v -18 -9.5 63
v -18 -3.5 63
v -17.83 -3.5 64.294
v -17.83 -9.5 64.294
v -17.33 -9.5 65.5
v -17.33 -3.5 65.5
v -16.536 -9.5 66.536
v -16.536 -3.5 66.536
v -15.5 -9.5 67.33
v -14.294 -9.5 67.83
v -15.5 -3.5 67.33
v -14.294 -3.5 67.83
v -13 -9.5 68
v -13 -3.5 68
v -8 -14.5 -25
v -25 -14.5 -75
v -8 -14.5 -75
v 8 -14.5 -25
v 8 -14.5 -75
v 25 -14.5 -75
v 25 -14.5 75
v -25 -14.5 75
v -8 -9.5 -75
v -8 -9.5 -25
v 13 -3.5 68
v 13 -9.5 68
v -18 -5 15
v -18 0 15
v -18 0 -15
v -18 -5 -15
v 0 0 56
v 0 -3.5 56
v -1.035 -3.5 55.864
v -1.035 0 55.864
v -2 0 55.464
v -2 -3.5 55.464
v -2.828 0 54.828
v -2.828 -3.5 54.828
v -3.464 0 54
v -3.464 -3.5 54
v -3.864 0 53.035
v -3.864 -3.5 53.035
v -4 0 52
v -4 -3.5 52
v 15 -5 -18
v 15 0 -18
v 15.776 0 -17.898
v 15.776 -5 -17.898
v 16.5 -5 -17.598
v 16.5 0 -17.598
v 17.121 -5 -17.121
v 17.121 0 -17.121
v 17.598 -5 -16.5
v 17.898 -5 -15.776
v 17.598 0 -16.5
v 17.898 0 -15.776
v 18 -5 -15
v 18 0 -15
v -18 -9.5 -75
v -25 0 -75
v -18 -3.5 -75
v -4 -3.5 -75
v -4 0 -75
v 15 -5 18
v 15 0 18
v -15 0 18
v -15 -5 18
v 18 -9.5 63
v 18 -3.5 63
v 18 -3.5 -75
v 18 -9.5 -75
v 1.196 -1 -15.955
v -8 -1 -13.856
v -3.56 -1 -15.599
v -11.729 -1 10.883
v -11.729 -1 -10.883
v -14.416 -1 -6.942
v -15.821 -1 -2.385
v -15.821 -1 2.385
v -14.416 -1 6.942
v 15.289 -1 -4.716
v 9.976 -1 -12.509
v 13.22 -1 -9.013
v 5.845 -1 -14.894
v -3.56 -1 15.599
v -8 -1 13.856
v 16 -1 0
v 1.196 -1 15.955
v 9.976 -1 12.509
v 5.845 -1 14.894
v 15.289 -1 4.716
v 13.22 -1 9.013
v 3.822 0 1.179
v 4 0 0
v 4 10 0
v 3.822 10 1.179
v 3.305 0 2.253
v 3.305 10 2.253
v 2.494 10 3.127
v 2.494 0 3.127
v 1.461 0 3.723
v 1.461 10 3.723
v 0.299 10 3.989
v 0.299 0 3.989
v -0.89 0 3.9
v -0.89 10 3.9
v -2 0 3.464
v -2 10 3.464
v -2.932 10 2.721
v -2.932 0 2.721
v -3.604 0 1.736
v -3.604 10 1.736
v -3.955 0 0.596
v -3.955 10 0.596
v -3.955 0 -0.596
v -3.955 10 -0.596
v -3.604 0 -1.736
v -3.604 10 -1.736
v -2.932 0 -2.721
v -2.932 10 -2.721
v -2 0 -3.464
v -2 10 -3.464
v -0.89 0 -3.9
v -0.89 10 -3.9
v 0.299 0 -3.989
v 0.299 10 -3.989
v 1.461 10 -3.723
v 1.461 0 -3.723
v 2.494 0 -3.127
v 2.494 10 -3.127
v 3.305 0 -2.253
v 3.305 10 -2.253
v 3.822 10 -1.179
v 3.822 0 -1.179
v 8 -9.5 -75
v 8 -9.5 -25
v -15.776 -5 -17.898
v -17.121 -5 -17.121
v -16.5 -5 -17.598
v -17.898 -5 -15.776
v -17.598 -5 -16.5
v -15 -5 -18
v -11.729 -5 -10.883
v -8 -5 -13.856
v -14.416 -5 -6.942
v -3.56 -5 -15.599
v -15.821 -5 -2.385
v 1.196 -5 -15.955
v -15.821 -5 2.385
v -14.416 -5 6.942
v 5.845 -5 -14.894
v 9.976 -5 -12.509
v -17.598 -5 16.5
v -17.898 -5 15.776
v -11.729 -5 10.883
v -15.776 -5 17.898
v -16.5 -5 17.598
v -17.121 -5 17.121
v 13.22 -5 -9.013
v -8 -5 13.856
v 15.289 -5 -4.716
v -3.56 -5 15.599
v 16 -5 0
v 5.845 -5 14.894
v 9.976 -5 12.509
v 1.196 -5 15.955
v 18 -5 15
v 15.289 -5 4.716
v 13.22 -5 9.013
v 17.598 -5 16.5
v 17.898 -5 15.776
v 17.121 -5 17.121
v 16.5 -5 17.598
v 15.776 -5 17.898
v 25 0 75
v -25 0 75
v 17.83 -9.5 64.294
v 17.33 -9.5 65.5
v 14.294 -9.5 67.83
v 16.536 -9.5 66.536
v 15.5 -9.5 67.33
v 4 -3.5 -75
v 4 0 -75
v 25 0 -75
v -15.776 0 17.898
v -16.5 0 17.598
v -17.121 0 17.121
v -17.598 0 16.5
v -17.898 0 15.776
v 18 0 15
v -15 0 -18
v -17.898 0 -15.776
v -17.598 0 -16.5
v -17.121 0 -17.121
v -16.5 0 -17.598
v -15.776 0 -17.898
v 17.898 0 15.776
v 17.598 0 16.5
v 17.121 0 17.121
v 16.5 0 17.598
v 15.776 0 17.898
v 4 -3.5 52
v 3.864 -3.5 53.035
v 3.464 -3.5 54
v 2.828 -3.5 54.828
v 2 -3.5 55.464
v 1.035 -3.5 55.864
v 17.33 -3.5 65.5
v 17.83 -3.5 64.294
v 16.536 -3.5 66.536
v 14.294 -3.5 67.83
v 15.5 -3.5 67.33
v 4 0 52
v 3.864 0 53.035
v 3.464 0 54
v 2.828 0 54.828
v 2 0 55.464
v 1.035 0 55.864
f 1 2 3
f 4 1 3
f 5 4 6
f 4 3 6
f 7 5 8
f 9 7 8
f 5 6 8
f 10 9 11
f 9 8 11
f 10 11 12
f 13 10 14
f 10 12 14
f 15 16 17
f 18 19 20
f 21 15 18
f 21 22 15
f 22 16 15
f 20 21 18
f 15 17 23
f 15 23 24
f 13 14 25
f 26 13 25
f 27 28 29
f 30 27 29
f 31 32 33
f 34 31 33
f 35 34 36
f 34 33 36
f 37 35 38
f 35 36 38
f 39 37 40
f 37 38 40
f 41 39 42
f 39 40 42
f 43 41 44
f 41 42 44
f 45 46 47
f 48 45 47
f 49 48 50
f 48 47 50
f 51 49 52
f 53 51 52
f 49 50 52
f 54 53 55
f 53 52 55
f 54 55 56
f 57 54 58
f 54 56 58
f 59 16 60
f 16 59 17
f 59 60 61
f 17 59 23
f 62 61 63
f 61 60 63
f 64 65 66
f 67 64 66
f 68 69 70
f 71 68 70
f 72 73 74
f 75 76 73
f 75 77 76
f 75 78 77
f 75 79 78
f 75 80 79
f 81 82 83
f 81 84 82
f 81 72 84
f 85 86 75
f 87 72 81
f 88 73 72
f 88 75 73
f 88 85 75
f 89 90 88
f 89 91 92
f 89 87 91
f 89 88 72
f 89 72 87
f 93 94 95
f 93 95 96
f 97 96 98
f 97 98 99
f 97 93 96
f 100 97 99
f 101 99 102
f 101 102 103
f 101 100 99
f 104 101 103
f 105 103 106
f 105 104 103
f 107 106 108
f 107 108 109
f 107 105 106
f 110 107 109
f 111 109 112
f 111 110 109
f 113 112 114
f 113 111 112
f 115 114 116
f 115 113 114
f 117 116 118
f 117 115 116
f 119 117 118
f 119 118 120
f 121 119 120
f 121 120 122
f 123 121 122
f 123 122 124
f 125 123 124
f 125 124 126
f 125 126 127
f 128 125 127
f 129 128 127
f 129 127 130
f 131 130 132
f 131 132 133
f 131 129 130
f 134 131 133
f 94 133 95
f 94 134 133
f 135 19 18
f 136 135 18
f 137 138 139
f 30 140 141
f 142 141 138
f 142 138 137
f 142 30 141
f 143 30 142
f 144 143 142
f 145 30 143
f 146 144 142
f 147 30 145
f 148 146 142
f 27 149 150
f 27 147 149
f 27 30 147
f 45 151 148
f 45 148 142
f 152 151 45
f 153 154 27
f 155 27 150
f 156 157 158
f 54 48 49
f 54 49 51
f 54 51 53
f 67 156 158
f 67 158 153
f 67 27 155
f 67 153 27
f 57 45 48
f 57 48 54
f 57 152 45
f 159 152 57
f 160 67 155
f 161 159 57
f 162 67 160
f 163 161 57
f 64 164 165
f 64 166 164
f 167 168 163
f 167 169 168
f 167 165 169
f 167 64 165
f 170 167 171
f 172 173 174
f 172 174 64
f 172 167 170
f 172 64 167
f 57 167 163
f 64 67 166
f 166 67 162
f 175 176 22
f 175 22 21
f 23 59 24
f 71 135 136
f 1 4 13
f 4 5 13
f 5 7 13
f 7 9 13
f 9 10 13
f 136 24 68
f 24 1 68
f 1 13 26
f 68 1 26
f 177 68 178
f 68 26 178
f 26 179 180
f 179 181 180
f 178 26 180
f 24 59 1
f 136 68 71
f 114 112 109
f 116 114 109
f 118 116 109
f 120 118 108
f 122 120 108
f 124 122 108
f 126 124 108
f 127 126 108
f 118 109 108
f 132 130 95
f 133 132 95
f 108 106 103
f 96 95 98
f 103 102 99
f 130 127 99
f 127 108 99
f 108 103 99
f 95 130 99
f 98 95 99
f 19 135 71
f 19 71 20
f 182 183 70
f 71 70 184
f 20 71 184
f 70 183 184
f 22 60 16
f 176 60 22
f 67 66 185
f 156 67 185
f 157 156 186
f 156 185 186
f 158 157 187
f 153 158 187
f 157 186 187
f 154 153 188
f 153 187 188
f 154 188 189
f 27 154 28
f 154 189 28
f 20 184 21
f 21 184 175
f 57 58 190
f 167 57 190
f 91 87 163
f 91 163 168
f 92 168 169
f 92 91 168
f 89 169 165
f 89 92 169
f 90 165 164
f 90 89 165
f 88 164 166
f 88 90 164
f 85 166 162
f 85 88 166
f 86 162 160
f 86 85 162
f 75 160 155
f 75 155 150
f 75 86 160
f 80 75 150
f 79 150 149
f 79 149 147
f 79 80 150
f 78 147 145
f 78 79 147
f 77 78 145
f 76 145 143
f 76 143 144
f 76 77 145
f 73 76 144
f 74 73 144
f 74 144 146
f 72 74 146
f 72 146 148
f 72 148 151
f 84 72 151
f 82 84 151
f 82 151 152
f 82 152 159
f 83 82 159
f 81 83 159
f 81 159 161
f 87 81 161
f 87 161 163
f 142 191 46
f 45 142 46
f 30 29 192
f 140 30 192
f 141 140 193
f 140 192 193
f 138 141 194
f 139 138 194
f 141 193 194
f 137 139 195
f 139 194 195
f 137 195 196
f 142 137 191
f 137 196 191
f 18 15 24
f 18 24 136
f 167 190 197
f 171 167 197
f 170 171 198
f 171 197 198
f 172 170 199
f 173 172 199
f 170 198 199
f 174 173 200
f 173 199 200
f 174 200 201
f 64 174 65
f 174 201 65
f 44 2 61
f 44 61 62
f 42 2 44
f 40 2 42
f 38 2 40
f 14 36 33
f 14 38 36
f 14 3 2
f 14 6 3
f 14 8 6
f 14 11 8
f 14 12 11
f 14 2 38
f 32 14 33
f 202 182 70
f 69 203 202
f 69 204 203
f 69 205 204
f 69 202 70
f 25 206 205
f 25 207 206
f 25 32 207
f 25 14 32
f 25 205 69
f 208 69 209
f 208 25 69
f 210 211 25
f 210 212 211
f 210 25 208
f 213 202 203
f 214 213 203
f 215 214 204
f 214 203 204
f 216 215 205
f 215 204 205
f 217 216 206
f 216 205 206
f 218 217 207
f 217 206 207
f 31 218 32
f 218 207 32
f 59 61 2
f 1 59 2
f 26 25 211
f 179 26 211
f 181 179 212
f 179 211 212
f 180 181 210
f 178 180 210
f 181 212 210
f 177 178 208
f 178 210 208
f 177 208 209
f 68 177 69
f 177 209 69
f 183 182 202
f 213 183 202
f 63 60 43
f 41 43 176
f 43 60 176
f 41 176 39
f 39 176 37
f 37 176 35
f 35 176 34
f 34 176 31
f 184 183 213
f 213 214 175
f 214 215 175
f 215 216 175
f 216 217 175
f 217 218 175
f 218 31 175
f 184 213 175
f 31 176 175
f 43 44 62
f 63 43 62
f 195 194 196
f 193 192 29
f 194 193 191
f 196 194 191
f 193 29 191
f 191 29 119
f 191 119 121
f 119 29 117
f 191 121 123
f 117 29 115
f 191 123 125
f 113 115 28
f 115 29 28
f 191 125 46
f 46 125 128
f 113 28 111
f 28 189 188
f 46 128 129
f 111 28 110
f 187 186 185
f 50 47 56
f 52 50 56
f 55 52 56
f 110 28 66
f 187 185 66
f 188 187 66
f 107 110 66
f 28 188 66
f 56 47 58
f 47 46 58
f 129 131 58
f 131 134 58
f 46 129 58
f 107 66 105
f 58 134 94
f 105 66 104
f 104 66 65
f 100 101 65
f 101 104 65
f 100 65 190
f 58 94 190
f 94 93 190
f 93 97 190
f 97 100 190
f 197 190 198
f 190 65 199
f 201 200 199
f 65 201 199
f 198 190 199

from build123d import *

# Parameters (mm, degrees)
F0_W      = 50
F0_H      = 150
F1_DEPTH  = 3.5
F3_DEPTH  = 6
F4_DEPTH  = 25
F5_W      = 50
F5_H      = 150
F6_DEPTH  = 5
F7_R      = 16
F7_R_2    = 4
F8_DEPTH  = 1
F9_DEPTH  = 5
F10_DEPTH = 10
F11_W     = 16
F11_H     = 50
F12_DEPTH = 6.1


with BuildPart() as f1:
    # F0 (on Front) → F1 (new body)
    with BuildSketch(Plane.XZ):
        Rectangle(F0_W, F0_H)
    extrude(amount=F1_DEPTH)

    # F2 (on face) → F3 (join)
    with BuildSketch(Plane.XZ.offset(3.5)):
        with BuildLine():
            Line((-13, 68), (13, 68))
            ThreePointArc((13, 68), (16.5355339059, 66.5355339059), (18, 63))
            Line((18, 63), (18, -68))
            Line((18, -68), (18, -75))
            Line((18, -75), (25, -75))
            Line((25, -75), (25, 75))
            Line((25, 75), (-25, 75))
            Line((-25, 75), (-25, -75))
            Line((-25, -75), (-18, -75))
            Line((-18, -75), (-18, -68))
            Line((-18, -68), (-18, 63))
            ThreePointArc((-18, 63), (-16.5355339059, 66.5355339059), (-13, 68))
        make_face()
    extrude(amount=F3_DEPTH)

    # F2 (on face) → F4 (cut)
    with BuildSketch(Plane.XZ.offset(3.5)):
        with BuildLine():
            Line((-4, -75), (4, -75))
            Line((4, -75), (4, 52))
            ThreePointArc((4, 52), (2.8284271247, 54.8284271247), (0, 56))
            ThreePointArc((0, 56), (-2.8284271247, 54.8284271247), (-4, 52))
            Line((-4, 52), (-4, -75))
        make_face()
    extrude(amount=-F4_DEPTH, mode=Mode.SUBTRACT)

    # F5 (on face) → F6 (join)
    with BuildSketch(Plane.XZ.offset(9.5)):
        Rectangle(F5_W, F5_H)
    extrude(amount=F6_DEPTH)

    # F11 (on face) → F12 (cut)
    with BuildSketch(Plane.XZ.offset(14.5)):
        with Locations((0, -50)):
            Rectangle(F11_W, F11_H)
    extrude(amount=-F12_DEPTH, mode=Mode.SUBTRACT)


with BuildPart() as f8:
    # F7 (on Front) → F8 (new body)
    with BuildSketch(Plane.XZ):
        with BuildLine():
            ThreePointArc((-18, -15), (-17.1213203436, -17.1213203436), (-15, -18))
            Line((-15, -18), (15, -18))
            ThreePointArc((15, -18), (17.1213203436, -17.1213203436), (18, -15))
            Line((18, -15), (18, 15))
            ThreePointArc((18, 15), (17.1213203436, 17.1213203436), (15, 18))
            Line((15, 18), (-15, 18))
            ThreePointArc((-15, 18), (-17.1213203436, 17.1213203436), (-18, 15))
            Line((-18, 15), (-18, -15))
        make_face()
        Circle(F7_R, mode=Mode.SUBTRACT)
        Circle(F7_R)
        Circle(F7_R_2, mode=Mode.SUBTRACT)
        Circle(F7_R_2)
    extrude(amount=F8_DEPTH)

    # F7 (on Front) → F9 (join)
    with BuildSketch(Plane.XZ):
        with BuildLine():
            ThreePointArc((-18, -15), (-17.1213203436, -17.1213203436), (-15, -18))
            Line((-15, -18), (15, -18))
            ThreePointArc((15, -18), (17.1213203436, -17.1213203436), (18, -15))
            Line((18, -15), (18, 15))
            ThreePointArc((18, 15), (17.1213203436, 17.1213203436), (15, 18))
            Line((15, 18), (-15, 18))
            ThreePointArc((-15, 18), (-17.1213203436, 17.1213203436), (-18, 15))
            Line((-18, 15), (-18, -15))
        make_face()
        Circle(F7_R, mode=Mode.SUBTRACT)
    extrude(amount=F9_DEPTH)

    # F7 (on Front) → F10 (join)
    with BuildSketch(Plane.XZ):
        Circle(F7_R_2)
    extrude(amount=-F10_DEPTH)


solid = Compound([f1.part, f8.part])
